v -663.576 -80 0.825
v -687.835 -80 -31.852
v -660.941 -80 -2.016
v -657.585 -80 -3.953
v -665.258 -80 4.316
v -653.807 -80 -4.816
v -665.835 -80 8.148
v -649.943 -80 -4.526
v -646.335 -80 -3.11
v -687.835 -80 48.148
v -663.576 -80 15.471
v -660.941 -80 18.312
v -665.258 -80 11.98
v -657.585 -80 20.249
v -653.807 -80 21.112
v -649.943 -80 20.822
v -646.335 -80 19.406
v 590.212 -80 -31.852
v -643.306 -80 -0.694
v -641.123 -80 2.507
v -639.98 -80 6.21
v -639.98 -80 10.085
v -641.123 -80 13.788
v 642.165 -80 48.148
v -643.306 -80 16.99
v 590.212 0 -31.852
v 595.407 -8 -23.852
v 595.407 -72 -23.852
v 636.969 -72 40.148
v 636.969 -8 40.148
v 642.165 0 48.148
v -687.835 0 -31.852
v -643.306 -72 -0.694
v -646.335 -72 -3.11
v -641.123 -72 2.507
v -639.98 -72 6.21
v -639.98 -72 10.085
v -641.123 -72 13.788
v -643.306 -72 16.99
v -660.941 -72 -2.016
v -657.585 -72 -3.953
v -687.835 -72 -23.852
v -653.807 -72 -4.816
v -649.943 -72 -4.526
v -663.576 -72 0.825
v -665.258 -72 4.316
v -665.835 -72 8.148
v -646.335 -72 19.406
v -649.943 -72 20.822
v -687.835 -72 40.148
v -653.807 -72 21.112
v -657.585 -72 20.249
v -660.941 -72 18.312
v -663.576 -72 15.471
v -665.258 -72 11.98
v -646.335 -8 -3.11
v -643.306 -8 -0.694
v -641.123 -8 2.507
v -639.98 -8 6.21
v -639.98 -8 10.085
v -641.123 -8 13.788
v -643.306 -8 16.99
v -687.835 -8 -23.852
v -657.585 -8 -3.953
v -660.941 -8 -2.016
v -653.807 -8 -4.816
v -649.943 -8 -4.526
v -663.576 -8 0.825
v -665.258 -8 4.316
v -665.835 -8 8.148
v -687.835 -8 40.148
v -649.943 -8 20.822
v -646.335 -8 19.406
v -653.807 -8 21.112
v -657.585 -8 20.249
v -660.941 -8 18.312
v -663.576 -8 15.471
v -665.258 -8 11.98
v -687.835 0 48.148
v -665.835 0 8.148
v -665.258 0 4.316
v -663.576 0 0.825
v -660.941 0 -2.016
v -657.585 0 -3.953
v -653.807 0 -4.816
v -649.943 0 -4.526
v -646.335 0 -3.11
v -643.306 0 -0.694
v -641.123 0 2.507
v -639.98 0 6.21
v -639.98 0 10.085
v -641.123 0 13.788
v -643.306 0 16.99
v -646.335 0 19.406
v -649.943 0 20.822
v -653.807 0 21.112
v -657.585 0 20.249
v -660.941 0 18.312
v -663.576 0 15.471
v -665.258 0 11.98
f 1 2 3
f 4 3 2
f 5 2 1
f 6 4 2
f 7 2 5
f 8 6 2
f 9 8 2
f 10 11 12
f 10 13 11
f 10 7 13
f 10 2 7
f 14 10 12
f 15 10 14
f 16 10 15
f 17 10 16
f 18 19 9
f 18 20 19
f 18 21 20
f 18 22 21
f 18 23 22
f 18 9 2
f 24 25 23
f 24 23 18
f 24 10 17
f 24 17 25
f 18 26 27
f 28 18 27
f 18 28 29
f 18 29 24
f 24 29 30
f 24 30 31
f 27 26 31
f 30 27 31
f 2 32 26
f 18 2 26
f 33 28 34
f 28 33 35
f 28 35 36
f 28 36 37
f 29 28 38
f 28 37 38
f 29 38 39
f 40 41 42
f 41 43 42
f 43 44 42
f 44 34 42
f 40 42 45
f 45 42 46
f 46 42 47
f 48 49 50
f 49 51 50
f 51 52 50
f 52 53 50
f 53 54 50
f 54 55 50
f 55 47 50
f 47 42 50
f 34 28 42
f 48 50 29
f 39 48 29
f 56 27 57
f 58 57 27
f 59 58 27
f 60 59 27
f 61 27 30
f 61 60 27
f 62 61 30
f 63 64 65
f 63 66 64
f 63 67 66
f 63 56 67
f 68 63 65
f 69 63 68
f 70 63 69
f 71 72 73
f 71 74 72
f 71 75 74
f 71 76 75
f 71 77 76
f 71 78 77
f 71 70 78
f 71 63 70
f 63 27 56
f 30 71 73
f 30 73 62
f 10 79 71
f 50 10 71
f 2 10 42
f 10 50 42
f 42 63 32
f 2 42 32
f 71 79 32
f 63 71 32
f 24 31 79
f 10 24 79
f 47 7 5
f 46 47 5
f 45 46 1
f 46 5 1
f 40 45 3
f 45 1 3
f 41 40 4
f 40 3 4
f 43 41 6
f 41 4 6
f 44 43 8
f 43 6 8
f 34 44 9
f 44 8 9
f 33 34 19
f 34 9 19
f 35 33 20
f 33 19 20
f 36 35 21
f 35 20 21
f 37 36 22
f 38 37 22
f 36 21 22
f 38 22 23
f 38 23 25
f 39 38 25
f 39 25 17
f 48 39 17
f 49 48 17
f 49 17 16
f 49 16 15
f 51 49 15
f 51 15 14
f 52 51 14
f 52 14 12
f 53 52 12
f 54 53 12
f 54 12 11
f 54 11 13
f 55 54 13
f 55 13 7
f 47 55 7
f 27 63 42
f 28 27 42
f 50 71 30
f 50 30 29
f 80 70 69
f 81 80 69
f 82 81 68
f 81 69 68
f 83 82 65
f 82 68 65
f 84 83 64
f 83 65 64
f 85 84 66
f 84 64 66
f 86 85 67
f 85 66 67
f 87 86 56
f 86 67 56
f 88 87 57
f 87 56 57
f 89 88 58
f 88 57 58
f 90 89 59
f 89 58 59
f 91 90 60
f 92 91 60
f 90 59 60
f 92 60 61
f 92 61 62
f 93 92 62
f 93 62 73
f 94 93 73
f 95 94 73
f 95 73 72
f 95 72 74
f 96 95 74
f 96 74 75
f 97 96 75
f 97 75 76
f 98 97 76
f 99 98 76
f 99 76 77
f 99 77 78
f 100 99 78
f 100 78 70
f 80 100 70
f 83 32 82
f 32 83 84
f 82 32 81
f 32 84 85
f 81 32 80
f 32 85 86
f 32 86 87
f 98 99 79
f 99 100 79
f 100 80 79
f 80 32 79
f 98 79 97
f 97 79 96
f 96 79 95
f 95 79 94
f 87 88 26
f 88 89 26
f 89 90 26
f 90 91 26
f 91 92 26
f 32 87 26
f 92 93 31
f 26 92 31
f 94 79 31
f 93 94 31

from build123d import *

# Parameters (mm, degrees)
F1_DEPTH = 80
F2_W     = 64
F2_H     = 64
F3_DEPTH = 1330
F4_D     = 26


with BuildPart() as f1:
    # F0 (on Front) → F1 (new body)
    with BuildSketch(Plane.XZ):
        Polygon((642.1647218585, 48.1479109465), (-687.8352781415, 48.1479109465), (-687.8352781415, -31.8520890535), (590.2121144027, -31.8520890535), align=None)
    extrude(amount=F1_DEPTH)

    # F2 (on face) → F3 (cut)
    with BuildSketch(Plane(origin=(-687.8352781415, 0, 0), x_dir=(0, -1, 0), z_dir=(-1, 0, 0))):
        with Locations((40, 8.1479109465)):
            Rectangle(F2_W, F2_H)
    extrude(amount=-F3_DEPTH, mode=Mode.SUBTRACT)

    # F4 (through all)
    with Locations(Plane(origin=(0, 0, 0), x_dir=(1, 0, 0), z_dir=(0, 1, 0))):
        with Locations((-652.8352781415, -8.1479109465)):
            Hole(F4_D / 2)


solid = f1.part
